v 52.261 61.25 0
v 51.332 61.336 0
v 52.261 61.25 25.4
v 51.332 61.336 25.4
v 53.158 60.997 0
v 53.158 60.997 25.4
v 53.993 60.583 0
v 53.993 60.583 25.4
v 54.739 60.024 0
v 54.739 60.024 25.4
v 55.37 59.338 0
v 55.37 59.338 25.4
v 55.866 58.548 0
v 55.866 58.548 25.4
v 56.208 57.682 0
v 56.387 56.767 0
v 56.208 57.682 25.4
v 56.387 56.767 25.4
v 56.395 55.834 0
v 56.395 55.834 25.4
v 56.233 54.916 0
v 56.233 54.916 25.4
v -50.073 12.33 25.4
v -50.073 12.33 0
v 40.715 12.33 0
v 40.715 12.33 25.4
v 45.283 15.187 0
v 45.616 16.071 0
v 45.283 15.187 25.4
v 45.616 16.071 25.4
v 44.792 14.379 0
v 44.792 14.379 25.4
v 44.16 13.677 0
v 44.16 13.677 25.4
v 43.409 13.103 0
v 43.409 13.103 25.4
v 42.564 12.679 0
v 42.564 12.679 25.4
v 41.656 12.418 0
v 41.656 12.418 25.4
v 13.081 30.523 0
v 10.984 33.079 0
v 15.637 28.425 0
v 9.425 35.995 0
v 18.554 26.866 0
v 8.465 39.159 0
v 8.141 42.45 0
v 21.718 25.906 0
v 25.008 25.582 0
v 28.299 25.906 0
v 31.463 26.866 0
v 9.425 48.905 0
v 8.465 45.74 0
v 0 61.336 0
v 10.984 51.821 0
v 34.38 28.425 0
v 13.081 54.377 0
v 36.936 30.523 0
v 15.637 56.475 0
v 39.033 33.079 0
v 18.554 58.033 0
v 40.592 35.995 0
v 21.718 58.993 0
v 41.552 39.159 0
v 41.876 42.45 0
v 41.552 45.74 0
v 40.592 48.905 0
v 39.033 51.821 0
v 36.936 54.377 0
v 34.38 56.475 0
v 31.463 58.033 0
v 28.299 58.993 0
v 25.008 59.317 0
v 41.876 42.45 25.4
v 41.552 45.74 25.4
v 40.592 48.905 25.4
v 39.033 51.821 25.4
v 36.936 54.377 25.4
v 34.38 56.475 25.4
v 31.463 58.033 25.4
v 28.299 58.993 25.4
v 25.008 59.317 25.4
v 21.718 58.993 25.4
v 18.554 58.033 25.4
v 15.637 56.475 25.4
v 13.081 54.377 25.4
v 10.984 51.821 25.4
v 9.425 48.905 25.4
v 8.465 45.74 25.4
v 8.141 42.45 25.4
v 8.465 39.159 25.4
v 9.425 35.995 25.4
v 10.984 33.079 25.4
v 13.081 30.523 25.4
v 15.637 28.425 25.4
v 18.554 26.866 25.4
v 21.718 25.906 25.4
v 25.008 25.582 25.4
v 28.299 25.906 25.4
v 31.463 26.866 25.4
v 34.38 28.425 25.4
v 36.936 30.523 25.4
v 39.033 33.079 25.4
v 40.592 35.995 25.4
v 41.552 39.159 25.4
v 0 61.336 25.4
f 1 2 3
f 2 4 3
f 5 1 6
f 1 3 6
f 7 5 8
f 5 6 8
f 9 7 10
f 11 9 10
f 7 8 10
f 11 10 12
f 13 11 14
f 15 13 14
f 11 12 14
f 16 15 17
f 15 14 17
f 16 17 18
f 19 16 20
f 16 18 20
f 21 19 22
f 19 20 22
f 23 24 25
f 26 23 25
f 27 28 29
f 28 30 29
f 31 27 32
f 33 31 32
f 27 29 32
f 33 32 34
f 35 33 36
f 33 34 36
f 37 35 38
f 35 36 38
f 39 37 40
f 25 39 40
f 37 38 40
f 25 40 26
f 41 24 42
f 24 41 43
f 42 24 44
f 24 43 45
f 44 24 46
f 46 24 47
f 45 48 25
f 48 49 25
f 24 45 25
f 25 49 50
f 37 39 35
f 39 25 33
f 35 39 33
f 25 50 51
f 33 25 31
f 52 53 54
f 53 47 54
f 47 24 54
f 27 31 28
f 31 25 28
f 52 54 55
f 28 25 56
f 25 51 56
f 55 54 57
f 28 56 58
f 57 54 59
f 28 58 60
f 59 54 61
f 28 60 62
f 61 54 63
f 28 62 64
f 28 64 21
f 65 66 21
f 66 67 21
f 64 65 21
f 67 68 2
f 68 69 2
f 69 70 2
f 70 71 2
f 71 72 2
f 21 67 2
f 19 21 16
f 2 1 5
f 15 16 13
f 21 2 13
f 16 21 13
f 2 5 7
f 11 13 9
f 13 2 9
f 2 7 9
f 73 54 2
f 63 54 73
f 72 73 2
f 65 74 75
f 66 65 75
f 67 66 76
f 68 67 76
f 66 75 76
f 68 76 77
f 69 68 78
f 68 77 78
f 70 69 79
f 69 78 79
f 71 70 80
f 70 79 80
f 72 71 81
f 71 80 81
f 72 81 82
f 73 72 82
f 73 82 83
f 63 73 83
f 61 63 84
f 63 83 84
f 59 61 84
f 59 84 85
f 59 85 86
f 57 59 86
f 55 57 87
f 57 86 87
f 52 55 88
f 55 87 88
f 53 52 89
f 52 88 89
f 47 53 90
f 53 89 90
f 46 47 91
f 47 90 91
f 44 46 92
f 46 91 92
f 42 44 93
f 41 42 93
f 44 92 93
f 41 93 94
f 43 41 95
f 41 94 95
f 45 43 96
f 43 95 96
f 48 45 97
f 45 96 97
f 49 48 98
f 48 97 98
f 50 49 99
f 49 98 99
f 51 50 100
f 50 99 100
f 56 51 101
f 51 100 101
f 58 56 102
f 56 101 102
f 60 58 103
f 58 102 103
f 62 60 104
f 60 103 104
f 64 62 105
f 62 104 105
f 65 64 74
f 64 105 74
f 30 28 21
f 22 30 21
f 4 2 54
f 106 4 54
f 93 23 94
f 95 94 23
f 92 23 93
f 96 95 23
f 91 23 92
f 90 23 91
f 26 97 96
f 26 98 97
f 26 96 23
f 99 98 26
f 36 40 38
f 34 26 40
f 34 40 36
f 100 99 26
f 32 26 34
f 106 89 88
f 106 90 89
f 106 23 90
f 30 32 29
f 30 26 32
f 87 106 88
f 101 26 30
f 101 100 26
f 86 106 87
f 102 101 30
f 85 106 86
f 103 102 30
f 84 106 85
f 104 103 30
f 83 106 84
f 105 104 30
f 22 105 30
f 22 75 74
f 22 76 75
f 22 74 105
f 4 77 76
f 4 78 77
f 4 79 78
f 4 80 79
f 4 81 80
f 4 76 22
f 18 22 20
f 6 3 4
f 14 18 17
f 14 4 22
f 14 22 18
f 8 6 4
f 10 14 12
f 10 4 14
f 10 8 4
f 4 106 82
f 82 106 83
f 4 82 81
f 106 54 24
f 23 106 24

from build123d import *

# Parameters (mm, degrees)
F1_DEPTH = 25.4
F2_R     = 16.867449
F3_DEPTH = 25.4
F4_R     = 5.08


with BuildPart() as f1:
    # F0 (on Top) → F1 (new body)
    with BuildSketch(Plane.XY):
        Polygon((57.987113, 61.335813), (0, 61.335813), (-50.072946, 12.33043), (44.593185, 12.33043), align=None)
    extrude(amount=F1_DEPTH)

    # F2 (on face) → F3 (cut)
    with BuildSketch(Plane.XY.offset(25.4)):
        with Locations((25.008492, 42.449769)):
            Circle(F2_R)
    extrude(amount=-F3_DEPTH, mode=Mode.SUBTRACT)

    # F4
    f4_edges = [f1.edges().sort_by_distance(p)[0] for p in [
        (44.593185, 12.33043, 12.7),
        (57.987113, 61.335813, 12.7),
    ]]
    fillet(f4_edges, radius=F4_R)


solid = f1.part
